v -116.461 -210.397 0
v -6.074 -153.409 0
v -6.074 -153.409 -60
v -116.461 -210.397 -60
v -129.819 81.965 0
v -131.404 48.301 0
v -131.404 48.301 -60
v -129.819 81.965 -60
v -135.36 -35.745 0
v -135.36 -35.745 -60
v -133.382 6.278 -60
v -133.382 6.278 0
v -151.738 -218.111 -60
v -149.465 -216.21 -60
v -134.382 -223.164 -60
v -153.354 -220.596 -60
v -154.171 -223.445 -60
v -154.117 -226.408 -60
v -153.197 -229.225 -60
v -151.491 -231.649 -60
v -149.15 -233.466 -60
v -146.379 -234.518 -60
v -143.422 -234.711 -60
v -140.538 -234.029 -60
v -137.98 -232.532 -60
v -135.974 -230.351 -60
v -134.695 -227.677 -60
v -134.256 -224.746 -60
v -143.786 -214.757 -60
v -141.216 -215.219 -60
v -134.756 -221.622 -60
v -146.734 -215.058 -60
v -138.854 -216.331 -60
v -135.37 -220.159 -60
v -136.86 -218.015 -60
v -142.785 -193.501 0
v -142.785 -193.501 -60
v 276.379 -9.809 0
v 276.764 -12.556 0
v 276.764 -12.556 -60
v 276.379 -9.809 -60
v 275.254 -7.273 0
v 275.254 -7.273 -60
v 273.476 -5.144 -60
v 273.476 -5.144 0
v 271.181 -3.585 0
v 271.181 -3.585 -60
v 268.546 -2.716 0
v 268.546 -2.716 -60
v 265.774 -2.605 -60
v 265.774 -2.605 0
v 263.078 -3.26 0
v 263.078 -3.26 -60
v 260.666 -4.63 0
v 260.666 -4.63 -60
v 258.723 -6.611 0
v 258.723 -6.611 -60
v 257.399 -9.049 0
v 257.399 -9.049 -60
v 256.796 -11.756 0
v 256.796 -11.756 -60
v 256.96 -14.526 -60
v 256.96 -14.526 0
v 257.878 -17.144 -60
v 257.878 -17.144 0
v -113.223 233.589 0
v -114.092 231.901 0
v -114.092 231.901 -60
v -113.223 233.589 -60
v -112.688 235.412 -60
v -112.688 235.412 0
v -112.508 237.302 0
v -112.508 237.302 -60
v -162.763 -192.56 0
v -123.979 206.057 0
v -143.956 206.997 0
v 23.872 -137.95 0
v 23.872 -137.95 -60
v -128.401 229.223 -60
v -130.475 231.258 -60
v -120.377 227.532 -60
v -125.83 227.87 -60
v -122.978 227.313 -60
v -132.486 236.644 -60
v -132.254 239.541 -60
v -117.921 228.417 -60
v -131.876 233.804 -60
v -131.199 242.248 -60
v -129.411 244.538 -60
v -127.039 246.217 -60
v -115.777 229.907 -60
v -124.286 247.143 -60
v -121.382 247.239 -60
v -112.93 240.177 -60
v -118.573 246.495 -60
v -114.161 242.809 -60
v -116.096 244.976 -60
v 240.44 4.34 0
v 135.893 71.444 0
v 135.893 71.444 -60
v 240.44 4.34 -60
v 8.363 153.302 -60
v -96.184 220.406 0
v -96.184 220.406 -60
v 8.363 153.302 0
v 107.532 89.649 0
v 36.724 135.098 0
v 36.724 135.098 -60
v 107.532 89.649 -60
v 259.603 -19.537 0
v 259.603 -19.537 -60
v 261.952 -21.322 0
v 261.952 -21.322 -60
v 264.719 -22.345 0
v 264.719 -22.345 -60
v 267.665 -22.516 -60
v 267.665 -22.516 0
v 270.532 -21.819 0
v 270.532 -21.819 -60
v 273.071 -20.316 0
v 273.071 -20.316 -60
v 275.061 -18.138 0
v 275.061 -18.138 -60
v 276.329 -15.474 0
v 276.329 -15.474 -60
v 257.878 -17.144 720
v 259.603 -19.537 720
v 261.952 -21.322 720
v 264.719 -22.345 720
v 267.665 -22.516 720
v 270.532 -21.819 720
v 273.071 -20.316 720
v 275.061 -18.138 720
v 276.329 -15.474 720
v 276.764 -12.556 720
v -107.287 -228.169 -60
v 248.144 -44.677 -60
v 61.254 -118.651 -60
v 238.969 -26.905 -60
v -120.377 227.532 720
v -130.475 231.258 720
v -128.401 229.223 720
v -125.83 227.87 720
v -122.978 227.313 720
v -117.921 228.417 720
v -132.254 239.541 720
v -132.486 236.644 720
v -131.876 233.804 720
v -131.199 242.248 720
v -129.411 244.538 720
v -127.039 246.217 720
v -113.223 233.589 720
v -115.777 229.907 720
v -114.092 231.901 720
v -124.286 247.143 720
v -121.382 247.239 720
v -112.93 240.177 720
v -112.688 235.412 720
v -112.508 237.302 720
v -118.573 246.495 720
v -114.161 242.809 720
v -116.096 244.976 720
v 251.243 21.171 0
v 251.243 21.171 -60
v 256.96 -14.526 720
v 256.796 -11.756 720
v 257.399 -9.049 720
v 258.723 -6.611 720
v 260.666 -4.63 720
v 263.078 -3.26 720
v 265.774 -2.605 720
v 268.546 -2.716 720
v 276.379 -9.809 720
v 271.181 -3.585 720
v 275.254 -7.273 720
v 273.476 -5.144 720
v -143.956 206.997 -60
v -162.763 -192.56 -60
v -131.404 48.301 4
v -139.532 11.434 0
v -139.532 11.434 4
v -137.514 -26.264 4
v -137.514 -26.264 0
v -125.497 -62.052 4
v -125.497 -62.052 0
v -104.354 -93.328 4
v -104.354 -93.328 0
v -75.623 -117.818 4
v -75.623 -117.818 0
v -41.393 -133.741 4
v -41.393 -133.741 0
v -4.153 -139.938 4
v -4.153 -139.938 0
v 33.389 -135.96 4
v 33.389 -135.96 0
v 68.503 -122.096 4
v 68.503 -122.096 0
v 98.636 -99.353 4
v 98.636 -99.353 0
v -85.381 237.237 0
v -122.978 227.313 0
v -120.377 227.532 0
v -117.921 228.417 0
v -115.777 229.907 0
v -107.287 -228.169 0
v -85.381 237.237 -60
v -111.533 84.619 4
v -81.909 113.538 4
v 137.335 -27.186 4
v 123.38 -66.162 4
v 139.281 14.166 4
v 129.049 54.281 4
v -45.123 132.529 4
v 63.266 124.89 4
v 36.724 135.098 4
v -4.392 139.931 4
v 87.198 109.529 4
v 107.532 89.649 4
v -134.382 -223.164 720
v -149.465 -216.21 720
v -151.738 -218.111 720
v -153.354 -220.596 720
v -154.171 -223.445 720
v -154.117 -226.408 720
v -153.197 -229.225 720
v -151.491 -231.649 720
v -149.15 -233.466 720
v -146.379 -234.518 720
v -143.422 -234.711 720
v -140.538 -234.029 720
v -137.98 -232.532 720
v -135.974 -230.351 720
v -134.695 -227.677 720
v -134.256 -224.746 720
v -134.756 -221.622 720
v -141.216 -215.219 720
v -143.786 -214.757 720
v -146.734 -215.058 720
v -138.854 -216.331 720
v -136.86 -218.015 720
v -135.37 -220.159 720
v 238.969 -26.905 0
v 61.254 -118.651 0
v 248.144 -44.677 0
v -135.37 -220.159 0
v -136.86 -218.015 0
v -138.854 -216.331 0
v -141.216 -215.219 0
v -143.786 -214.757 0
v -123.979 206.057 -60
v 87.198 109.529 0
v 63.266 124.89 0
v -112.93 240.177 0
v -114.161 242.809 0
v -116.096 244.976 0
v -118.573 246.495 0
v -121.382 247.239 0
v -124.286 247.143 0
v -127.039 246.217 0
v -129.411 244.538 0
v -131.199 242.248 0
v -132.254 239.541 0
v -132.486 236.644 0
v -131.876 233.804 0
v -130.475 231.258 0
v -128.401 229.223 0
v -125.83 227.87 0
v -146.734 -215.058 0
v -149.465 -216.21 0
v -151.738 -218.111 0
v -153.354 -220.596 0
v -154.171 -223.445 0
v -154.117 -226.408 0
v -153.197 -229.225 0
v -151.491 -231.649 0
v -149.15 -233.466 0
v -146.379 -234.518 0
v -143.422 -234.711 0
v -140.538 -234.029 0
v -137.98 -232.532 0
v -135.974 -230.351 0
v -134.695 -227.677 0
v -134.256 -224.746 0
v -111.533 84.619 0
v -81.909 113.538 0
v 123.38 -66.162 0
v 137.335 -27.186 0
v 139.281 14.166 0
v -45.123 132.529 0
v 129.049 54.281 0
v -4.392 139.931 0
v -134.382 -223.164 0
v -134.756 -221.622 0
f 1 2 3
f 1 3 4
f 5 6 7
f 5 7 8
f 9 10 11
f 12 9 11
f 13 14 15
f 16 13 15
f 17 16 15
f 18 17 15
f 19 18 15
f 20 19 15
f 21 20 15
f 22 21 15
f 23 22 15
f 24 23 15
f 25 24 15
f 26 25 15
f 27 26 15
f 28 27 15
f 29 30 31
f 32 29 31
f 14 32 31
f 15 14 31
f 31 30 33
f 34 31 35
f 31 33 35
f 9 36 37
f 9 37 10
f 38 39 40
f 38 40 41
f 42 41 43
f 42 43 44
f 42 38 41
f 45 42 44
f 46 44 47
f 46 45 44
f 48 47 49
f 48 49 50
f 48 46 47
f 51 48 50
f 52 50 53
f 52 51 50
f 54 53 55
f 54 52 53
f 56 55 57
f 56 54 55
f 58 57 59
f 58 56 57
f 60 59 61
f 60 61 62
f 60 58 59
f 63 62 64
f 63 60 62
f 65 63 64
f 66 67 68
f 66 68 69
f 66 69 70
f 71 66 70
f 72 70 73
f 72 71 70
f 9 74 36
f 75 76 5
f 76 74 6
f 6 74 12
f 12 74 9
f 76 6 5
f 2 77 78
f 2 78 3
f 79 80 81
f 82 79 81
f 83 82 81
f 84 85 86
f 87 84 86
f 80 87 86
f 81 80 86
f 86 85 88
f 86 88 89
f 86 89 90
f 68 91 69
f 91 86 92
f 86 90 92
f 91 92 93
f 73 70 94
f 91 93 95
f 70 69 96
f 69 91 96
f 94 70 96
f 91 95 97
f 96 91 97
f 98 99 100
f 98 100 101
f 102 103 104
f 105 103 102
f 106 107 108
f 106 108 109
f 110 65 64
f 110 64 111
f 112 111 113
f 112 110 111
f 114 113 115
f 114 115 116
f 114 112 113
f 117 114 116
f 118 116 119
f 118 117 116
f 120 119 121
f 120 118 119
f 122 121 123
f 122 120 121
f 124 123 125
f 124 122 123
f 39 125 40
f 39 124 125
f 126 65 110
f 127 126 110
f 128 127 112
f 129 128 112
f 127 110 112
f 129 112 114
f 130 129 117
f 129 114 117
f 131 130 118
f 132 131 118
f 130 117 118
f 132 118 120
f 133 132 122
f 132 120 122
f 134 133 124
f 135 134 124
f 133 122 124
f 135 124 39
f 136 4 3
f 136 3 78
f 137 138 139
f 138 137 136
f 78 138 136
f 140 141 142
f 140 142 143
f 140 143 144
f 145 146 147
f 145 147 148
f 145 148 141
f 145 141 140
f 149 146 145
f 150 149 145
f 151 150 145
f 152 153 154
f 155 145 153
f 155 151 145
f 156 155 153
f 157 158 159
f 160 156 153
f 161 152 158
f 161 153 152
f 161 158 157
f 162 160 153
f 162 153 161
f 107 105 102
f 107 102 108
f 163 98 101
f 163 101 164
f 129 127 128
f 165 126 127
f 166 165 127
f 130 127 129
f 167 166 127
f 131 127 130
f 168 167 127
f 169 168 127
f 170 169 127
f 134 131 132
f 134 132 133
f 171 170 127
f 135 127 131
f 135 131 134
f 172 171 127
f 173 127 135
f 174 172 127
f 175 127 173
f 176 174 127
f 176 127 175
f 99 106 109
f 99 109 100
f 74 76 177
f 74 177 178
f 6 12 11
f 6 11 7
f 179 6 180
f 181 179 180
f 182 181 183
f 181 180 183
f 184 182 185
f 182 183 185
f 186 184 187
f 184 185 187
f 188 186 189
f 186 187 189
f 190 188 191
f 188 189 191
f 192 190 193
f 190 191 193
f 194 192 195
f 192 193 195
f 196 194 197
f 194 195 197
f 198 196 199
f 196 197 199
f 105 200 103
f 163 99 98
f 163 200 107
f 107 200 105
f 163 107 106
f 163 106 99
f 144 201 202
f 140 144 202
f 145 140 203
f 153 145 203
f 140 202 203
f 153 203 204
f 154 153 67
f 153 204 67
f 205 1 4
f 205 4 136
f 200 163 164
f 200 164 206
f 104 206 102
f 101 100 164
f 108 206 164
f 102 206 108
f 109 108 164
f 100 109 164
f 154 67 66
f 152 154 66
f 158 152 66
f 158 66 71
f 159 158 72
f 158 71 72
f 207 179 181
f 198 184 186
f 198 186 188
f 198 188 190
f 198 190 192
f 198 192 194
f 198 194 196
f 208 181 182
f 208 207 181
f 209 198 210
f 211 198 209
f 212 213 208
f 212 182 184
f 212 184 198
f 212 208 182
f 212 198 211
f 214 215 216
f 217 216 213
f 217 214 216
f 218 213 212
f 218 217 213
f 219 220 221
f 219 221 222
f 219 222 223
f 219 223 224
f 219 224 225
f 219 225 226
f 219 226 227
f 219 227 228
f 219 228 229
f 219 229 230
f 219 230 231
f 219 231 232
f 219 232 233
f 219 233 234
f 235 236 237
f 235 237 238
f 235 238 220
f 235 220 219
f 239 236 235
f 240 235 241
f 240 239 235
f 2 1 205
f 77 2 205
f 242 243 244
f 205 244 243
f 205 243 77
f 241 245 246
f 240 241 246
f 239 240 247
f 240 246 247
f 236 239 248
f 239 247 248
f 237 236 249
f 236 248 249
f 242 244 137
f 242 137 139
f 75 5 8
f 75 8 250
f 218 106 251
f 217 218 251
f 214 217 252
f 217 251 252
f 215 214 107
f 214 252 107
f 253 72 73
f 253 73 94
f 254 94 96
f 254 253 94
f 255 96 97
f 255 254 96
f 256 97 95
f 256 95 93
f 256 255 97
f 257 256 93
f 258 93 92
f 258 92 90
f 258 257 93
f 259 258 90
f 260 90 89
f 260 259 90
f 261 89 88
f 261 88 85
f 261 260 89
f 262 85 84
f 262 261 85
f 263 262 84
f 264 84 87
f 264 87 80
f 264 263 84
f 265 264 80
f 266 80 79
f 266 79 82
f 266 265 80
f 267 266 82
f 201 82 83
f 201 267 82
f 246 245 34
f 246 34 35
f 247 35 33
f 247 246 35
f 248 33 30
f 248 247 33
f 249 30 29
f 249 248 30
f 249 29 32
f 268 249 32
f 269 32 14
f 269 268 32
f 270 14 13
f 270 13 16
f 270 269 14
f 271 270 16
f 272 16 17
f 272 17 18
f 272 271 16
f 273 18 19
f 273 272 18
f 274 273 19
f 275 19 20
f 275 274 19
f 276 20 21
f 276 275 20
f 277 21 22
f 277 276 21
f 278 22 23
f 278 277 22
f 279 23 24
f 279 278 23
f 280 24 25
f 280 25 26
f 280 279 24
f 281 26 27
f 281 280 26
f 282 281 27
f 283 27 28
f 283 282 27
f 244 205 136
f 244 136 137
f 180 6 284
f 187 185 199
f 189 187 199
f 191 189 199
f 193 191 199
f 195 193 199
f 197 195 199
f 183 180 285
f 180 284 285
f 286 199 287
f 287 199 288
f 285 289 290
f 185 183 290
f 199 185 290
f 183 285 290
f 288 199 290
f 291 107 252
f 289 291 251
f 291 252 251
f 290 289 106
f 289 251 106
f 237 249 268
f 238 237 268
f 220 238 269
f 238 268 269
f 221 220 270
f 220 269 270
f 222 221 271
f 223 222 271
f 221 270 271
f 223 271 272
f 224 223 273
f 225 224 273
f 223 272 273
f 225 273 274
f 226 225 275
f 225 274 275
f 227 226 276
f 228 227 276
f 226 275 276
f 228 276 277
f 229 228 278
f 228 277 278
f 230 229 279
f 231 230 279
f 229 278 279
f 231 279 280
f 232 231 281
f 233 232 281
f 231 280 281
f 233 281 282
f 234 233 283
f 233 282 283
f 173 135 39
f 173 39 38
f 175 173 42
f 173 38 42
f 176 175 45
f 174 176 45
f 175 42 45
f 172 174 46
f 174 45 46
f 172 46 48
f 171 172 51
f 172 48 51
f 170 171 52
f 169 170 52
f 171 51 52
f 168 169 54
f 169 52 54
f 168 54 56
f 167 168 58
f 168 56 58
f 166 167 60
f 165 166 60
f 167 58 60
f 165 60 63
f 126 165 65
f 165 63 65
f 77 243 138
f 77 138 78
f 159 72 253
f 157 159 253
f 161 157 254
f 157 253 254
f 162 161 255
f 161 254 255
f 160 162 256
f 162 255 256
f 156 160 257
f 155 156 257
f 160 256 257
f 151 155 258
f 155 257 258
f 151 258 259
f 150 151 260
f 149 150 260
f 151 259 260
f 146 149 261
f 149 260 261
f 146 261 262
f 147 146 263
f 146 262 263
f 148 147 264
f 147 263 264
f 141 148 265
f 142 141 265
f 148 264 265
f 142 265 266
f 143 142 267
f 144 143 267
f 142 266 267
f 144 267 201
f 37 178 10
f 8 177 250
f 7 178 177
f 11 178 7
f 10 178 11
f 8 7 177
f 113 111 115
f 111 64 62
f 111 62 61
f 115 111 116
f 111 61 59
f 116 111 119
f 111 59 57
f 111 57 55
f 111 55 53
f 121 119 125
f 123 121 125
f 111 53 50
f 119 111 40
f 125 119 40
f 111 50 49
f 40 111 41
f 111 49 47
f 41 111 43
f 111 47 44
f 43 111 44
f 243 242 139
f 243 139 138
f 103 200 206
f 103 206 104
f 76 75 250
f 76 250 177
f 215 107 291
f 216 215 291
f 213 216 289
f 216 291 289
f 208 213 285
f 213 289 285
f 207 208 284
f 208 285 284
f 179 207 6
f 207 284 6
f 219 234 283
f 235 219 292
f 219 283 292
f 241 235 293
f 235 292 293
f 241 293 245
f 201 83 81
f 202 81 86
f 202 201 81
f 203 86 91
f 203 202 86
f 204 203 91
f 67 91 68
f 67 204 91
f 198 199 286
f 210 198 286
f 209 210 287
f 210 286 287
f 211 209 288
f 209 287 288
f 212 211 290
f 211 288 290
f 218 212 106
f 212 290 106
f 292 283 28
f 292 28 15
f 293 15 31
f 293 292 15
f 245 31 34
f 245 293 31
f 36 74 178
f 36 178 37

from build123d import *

# Parameters (mm, degrees)
F1_DEPTH      = 720
F1_DEPTH_BACK = 60
F2_DEPTH      = 60
F3_DEPTH      = 4


with BuildPart() as f1:
    # F0 (on Top) → F1 (new body, two sides)
    with BuildSketch(Plane.XY) as f1_sk:
        with BuildLine():
            ThreePointArc((276.7638016146, -12.5562208278), (269.5784120932, -2.9604942866), (258.3482080438, -7.1545743333))
            Line((258.3482080438, -7.1545743333), (266.7638016146, -12.5562208278))
            Line((266.7638016146, -12.5562208278), (257.8780417427, -17.1435154008))
            ThreePointArc((257.8780417427, -17.1435154008), (269.124140709, -22.2736690196), (276.7638016146, -12.5562208278))
        make_face()
        with BuildLine():
            Line((266.7638016146, -12.5562208278), (258.3482080438, -7.1545743333))
            ThreePointArc((258.3482080438, -7.1545743333), (256.7748605471, -12.0860545267), (257.8780417427, -17.1435154008))
            Line((257.8780417427, -17.1435154008), (266.7638016146, -12.5562208278))
        make_face()
    extrude(amount=F1_DEPTH)
    extrude(f1_sk.sketch, amount=-F1_DEPTH_BACK)


with BuildPart() as f1b:
    # F0 (on Top) → F1, piece 2 (new body, two sides)
    with BuildSketch(Plane.XY) as f1_2_sk:
        with BuildLine():
            Line((-144.2559070197, -224.7461185944), (-135.3701471478, -220.1588240214))
            ThreePointArc((-135.3701471478, -220.1588240214), (-138.8542605252, -216.3305250236), (-143.7857407186, -214.7571775269))
            Line((-143.7857407186, -214.7571775269), (-144.2559070197, -224.7461185944))
        make_face()
        with BuildLine():
            ThreePointArc((-134.2559070197, -224.7461185944), (-134.538458828, -222.3857795), (-135.3701471478, -220.1588240214))
            Line((-135.3701471478, -220.1588240214), (-144.2559070197, -224.7461185944))
            Line((-144.2559070197, -224.7461185944), (-143.7857407186, -214.7571775269))
            ThreePointArc((-143.7857407186, -214.7571775269), (-151.4912944665, -231.6489563076), (-134.2559070197, -224.7461185944))
        make_face()
    extrude(amount=F1_DEPTH)
    extrude(f1_2_sk.sketch, amount=-F1_DEPTH_BACK)


with BuildPart() as f1c:
    # F0 (on Top) → F1, piece 3 (new body, two sides)
    with BuildSketch(Plane.XY) as f1_3_sk:
        with BuildLine():
            ThreePointArc((-122.978060896, 227.3133983548), (-117.9206000219, 228.4165795504), (-114.0923010241, 231.9006929277))
            Line((-114.0923010241, 231.9006929277), (-122.5078945948, 237.3023394222))
            Line((-122.5078945948, 237.3023394223), (-122.978060896, 227.3133983548))
        make_face()
        with BuildLine():
            Line((-122.5078945948, 237.3023394222), (-114.0923010241, 231.9006929277))
            ThreePointArc((-114.0923010241, 231.9006929277), (-112.9121680536, 234.4877289437), (-112.5078945948, 237.3023394223))
            ThreePointArc((-112.5078945948, 237.3023394223), (-129.410732308, 244.5377268691), (-122.978060896, 227.3133983548))
            Line((-122.978060896, 227.3133983548), (-122.5078945948, 237.3023394223))
        make_face()
    extrude(amount=F1_DEPTH)
    extrude(f1_3_sk.sketch, amount=-F1_DEPTH_BACK)


with BuildPart() as f2:
    # F0 (on Top) → F2 (new body)
    with BuildSketch(Plane.XY):
        with BuildLine():
            ThreePointArc((70.4285357503, -136.4226898127), (33.2793326675, -149.8793346692), (-6.0739824516, -153.4093728585))
            Line((-6.0739824516, -153.4093728585), (-116.4612501404, -210.3970611702))
            Line((-116.4612501404, -210.3970611702), (-107.2866609945, -228.168580914))
            Line((-107.2866609945, -228.168580914), (70.4285357503, -136.4226898127))
        make_face()
        with BuildLine():
            Line((238.9691447353, -26.905278252), (128.5818770465, -83.8929665637))
            ThreePointArc((128.5818770465, -83.8929665637), (102.9132112828, -113.9306801837), (70.4285357503, -136.4226898127))
            Line((70.4285357503, -136.4226898127), (248.1437338812, -44.6767979958))
            Line((248.1437338812, -44.6767979958), (238.9691447353, -26.905278252))
        make_face()
        with BuildLine():
            Line((98.6360113438, -99.3525906365), (61.2539473835, -118.6511696667))
            Line((61.2539473835, -118.6511696667), (23.871883251, -137.9497487857))
            ThreePointArc((23.871883251, -137.9497487857), (64.2221240214, -124.4006382065), (98.6360113438, -99.3525906365))
        make_face()
        with BuildLine():
            Line((128.5818770465, -83.8929665637), (98.6360113438, -99.3525906365))
            ThreePointArc((98.6360113438, -99.3525906365), (64.2221240214, -124.4006382065), (23.871883251, -137.9497487857))
            Line((23.871883251, -137.9497487857), (-6.0739824516, -153.4093728585))
            ThreePointArc((-6.0739824516, -153.4093728585), (33.2793326675, -149.8793346692), (70.4285357503, -136.4226898127))
            ThreePointArc((70.4285357503, -136.4226898127), (102.9132112828, -113.9306801837), (128.5818770465, -83.8929665637))
        make_face()
    extrude(amount=-F2_DEPTH)


with BuildPart() as f2b:
    # F0 (on Top) → F2, piece 2 (new body)
    with BuildSketch(Plane.XY):
        with BuildLine():
            ThreePointArc((-153.3597829644, 7.218442544), (-146.4389778477, 46.1189192262), (-129.8194228483, 81.9649095345))
            Line((-129.8194228483, 81.9649095345), (-123.9785747848, 206.0569317632))
            Line((-123.9785747848, 206.0569317632), (-143.9564569197, 206.9972643655))
            Line((-143.9564569197, 206.9972643655), (-153.3597829644, 7.218442544))
        make_face()
        with BuildLine():
            Line((-135.3598730949, -35.7449962334), (-133.3819010578, 6.2781050924))
            Line((-133.3819010578, 6.2781050924), (-131.4039285197, 48.3012170613))
            ThreePointArc((-131.4039285197, 48.3012170613), (-139.8451749445, 6.5823282158), (-135.3598730949, -35.7449962334))
        make_face()
        with BuildLine():
            Line((-142.7852268298, -193.5007109354), (-136.9443787663, -69.4086887067))
            ThreePointArc((-136.9443787663, -69.4086887067), (-150.1234688197, -32.1601158765), (-153.3597829644, 7.218442544))
            Line((-153.3597829644, 7.218442544), (-162.7631089647, -192.5603783331))
            Line((-162.7631089647, -192.5603783331), (-142.7852268298, -193.5007109354))
        make_face()
        with BuildLine():
            Line((-136.9443787663, -69.4086887067), (-135.3598730949, -35.7449962334))
            ThreePointArc((-135.3598730949, -35.7449962334), (-139.8451749445, 6.5823282158), (-131.4039285197, 48.3012170613))
            Line((-131.4039285197, 48.3012170613), (-129.8194228483, 81.9649095345))
            ThreePointArc((-129.8194228483, 81.9649095345), (-146.4389778477, 46.1189192262), (-153.3597829644, 7.218442544))
            ThreePointArc((-153.3597829644, 7.218442544), (-150.1234688197, -32.1601158765), (-136.9443787663, -69.4086887067))
        make_face()
    extrude(amount=-F2_DEPTH)


with BuildPart() as f2c:
    # F0 (on Top) → F2, piece 3 (new body)
    with BuildSketch(Plane.XY):
        with BuildLine():
            Line((-96.1839179055, 220.4059891874), (8.3625017198, 153.3016552704))
            ThreePointArc((8.3625017198, 153.3016552704), (47.2102590205, 146.0907950108), (82.9312495473, 129.2042444821))
            Line((82.9312495473, 129.2042444821), (-85.3806249165, 237.237176329))
            Line((-85.3806249165, 237.237176329), (-96.1839179055, 220.4059891874))
        make_face()
        with BuildLine():
            ThreePointArc((82.9312495473, 129.2042444821), (113.1596459525, 103.7604137981), (135.8934052999, 71.444463324))
            Line((135.8934052999, 71.444463324), (240.4398249252, 4.340129407))
            Line((240.4398249252, 4.340129407), (251.2431179142, 21.1713165485))
            Line((251.2431179142, 21.1713165485), (82.9312495473, 129.2042444821))
        make_face()
        with BuildLine():
            Line((36.7238617511, 135.09758687), (72.1279579672, 112.3730564362))
            Line((72.1279579672, 112.3730564362), (107.5320452686, 89.6485317244))
            ThreePointArc((107.5320452686, 89.6485317244), (75.6230509232, 117.8183099907), (36.7238617511, 135.09758687))
        make_face()
        with BuildLine():
            Line((8.3625017198, 153.3016552704), (36.7238617511, 135.09758687))
            ThreePointArc((36.7238617511, 135.09758687), (75.6230509232, 117.8183099907), (107.5320452686, 89.6485317244))
            Line((107.5320452686, 89.6485317244), (135.8934052999, 71.444463324))
            ThreePointArc((135.8934052999, 71.444463324), (113.1596459525, 103.7604137981), (82.9312495473, 129.2042444821))
            ThreePointArc((82.9312495473, 129.2042444821), (47.2102590205, 146.0907950108), (8.3625017198, 153.3016552704))
        make_face()
    extrude(amount=-F2_DEPTH)


with BuildPart() as f3:
    # F0 (on Top) → F3 (new body)
    with BuildSketch(Plane.XY):
        with BuildLine():
            ThreePointArc((-133.3819010578, 6.2781050924), (-61.2539473111, 118.6511697041), (72.1279579672, 112.3730564362))
            Line((72.1279579672, 112.3730564362), (36.7238617511, 135.09758687))
            ThreePointArc((36.7238617511, 135.09758687), (-64.2221240214, 124.4006382065), (-131.4039285197, 48.3012170613))
            Line((-131.4039285197, 48.3012170613), (-133.3819010578, 6.2781050924))
        make_face()
        with BuildLine():
            ThreePointArc((61.2539473835, -118.6511696667), (114.0380625144, -69.4655773121), (133.5295702582, 0))
            ThreePointArc((133.5295702582, 0), (117.1779871911, 64.0270681133), (72.1279579672, 112.3730564362))
            ThreePointArc((72.1279579672, 112.3730564362), (-61.2539473111, 118.6511697041), (-133.3819010578, 6.2781050924))
            ThreePointArc((-133.3819010578, 6.2781050924), (-72.1279512275, -112.3730607622), (61.2539473835, -118.6511696667))
        make_face()
        with BuildLine():
            Line((36.7238617511, 135.09758687), (72.1279579672, 112.3730564362))
            Line((72.1279579672, 112.3730564362), (107.5320452686, 89.6485317244))
            ThreePointArc((107.5320452686, 89.6485317244), (75.6230509232, 117.8183099907), (36.7238617511, 135.09758687))
        make_face()
        with BuildLine():
            ThreePointArc((72.1279579672, 112.3730564362), (117.1779871911, 64.0270681133), (133.5295702582, 0))
            ThreePointArc((133.5295702582, 0), (114.0380625144, -69.4655773121), (61.2539473835, -118.6511696667))
            Line((61.2539473835, -118.6511696667), (98.6360113438, -99.3525906365))
            ThreePointArc((98.6360113438, -99.3525906365), (129.245970127, -53.809657181), (140, 0))
            ThreePointArc((140, 0), (131.6329866287, 47.6734394731), (107.5320452686, 89.6485317244))
            Line((107.5320452686, 89.6485317244), (72.1279579672, 112.3730564362))
        make_face()
        with BuildLine():
            Line((23.871883251, -137.9497487857), (61.2539473835, -118.6511696667))
            ThreePointArc((61.2539473835, -118.6511696667), (-72.1279512275, -112.3730607622), (-133.3819010578, 6.2781050924))
            Line((-133.3819010578, 6.2781050924), (-135.3598730949, -35.7449962334))
            ThreePointArc((-135.3598730949, -35.7449962334), (-75.6230509232, -117.8183099907), (23.871883251, -137.9497487857))
        make_face()
        with BuildLine():
            Line((-135.3598730949, -35.7449962334), (-133.3819010578, 6.2781050924))
            Line((-133.3819010578, 6.2781050924), (-131.4039285197, 48.3012170613))
            ThreePointArc((-131.4039285197, 48.3012170613), (-139.8451749445, 6.5823282158), (-135.3598730949, -35.7449962334))
        make_face()
        with BuildLine():
            Line((98.6360113438, -99.3525906365), (61.2539473835, -118.6511696667))
            Line((61.2539473835, -118.6511696667), (23.871883251, -137.9497487857))
            ThreePointArc((23.871883251, -137.9497487857), (64.2221240214, -124.4006382065), (98.6360113438, -99.3525906365))
        make_face()
    extrude(amount=F3_DEPTH)


solid = Compound([f1.part, f1b.part, f1c.part, f2.part, f2b.part, f2c.part, f3.part])
